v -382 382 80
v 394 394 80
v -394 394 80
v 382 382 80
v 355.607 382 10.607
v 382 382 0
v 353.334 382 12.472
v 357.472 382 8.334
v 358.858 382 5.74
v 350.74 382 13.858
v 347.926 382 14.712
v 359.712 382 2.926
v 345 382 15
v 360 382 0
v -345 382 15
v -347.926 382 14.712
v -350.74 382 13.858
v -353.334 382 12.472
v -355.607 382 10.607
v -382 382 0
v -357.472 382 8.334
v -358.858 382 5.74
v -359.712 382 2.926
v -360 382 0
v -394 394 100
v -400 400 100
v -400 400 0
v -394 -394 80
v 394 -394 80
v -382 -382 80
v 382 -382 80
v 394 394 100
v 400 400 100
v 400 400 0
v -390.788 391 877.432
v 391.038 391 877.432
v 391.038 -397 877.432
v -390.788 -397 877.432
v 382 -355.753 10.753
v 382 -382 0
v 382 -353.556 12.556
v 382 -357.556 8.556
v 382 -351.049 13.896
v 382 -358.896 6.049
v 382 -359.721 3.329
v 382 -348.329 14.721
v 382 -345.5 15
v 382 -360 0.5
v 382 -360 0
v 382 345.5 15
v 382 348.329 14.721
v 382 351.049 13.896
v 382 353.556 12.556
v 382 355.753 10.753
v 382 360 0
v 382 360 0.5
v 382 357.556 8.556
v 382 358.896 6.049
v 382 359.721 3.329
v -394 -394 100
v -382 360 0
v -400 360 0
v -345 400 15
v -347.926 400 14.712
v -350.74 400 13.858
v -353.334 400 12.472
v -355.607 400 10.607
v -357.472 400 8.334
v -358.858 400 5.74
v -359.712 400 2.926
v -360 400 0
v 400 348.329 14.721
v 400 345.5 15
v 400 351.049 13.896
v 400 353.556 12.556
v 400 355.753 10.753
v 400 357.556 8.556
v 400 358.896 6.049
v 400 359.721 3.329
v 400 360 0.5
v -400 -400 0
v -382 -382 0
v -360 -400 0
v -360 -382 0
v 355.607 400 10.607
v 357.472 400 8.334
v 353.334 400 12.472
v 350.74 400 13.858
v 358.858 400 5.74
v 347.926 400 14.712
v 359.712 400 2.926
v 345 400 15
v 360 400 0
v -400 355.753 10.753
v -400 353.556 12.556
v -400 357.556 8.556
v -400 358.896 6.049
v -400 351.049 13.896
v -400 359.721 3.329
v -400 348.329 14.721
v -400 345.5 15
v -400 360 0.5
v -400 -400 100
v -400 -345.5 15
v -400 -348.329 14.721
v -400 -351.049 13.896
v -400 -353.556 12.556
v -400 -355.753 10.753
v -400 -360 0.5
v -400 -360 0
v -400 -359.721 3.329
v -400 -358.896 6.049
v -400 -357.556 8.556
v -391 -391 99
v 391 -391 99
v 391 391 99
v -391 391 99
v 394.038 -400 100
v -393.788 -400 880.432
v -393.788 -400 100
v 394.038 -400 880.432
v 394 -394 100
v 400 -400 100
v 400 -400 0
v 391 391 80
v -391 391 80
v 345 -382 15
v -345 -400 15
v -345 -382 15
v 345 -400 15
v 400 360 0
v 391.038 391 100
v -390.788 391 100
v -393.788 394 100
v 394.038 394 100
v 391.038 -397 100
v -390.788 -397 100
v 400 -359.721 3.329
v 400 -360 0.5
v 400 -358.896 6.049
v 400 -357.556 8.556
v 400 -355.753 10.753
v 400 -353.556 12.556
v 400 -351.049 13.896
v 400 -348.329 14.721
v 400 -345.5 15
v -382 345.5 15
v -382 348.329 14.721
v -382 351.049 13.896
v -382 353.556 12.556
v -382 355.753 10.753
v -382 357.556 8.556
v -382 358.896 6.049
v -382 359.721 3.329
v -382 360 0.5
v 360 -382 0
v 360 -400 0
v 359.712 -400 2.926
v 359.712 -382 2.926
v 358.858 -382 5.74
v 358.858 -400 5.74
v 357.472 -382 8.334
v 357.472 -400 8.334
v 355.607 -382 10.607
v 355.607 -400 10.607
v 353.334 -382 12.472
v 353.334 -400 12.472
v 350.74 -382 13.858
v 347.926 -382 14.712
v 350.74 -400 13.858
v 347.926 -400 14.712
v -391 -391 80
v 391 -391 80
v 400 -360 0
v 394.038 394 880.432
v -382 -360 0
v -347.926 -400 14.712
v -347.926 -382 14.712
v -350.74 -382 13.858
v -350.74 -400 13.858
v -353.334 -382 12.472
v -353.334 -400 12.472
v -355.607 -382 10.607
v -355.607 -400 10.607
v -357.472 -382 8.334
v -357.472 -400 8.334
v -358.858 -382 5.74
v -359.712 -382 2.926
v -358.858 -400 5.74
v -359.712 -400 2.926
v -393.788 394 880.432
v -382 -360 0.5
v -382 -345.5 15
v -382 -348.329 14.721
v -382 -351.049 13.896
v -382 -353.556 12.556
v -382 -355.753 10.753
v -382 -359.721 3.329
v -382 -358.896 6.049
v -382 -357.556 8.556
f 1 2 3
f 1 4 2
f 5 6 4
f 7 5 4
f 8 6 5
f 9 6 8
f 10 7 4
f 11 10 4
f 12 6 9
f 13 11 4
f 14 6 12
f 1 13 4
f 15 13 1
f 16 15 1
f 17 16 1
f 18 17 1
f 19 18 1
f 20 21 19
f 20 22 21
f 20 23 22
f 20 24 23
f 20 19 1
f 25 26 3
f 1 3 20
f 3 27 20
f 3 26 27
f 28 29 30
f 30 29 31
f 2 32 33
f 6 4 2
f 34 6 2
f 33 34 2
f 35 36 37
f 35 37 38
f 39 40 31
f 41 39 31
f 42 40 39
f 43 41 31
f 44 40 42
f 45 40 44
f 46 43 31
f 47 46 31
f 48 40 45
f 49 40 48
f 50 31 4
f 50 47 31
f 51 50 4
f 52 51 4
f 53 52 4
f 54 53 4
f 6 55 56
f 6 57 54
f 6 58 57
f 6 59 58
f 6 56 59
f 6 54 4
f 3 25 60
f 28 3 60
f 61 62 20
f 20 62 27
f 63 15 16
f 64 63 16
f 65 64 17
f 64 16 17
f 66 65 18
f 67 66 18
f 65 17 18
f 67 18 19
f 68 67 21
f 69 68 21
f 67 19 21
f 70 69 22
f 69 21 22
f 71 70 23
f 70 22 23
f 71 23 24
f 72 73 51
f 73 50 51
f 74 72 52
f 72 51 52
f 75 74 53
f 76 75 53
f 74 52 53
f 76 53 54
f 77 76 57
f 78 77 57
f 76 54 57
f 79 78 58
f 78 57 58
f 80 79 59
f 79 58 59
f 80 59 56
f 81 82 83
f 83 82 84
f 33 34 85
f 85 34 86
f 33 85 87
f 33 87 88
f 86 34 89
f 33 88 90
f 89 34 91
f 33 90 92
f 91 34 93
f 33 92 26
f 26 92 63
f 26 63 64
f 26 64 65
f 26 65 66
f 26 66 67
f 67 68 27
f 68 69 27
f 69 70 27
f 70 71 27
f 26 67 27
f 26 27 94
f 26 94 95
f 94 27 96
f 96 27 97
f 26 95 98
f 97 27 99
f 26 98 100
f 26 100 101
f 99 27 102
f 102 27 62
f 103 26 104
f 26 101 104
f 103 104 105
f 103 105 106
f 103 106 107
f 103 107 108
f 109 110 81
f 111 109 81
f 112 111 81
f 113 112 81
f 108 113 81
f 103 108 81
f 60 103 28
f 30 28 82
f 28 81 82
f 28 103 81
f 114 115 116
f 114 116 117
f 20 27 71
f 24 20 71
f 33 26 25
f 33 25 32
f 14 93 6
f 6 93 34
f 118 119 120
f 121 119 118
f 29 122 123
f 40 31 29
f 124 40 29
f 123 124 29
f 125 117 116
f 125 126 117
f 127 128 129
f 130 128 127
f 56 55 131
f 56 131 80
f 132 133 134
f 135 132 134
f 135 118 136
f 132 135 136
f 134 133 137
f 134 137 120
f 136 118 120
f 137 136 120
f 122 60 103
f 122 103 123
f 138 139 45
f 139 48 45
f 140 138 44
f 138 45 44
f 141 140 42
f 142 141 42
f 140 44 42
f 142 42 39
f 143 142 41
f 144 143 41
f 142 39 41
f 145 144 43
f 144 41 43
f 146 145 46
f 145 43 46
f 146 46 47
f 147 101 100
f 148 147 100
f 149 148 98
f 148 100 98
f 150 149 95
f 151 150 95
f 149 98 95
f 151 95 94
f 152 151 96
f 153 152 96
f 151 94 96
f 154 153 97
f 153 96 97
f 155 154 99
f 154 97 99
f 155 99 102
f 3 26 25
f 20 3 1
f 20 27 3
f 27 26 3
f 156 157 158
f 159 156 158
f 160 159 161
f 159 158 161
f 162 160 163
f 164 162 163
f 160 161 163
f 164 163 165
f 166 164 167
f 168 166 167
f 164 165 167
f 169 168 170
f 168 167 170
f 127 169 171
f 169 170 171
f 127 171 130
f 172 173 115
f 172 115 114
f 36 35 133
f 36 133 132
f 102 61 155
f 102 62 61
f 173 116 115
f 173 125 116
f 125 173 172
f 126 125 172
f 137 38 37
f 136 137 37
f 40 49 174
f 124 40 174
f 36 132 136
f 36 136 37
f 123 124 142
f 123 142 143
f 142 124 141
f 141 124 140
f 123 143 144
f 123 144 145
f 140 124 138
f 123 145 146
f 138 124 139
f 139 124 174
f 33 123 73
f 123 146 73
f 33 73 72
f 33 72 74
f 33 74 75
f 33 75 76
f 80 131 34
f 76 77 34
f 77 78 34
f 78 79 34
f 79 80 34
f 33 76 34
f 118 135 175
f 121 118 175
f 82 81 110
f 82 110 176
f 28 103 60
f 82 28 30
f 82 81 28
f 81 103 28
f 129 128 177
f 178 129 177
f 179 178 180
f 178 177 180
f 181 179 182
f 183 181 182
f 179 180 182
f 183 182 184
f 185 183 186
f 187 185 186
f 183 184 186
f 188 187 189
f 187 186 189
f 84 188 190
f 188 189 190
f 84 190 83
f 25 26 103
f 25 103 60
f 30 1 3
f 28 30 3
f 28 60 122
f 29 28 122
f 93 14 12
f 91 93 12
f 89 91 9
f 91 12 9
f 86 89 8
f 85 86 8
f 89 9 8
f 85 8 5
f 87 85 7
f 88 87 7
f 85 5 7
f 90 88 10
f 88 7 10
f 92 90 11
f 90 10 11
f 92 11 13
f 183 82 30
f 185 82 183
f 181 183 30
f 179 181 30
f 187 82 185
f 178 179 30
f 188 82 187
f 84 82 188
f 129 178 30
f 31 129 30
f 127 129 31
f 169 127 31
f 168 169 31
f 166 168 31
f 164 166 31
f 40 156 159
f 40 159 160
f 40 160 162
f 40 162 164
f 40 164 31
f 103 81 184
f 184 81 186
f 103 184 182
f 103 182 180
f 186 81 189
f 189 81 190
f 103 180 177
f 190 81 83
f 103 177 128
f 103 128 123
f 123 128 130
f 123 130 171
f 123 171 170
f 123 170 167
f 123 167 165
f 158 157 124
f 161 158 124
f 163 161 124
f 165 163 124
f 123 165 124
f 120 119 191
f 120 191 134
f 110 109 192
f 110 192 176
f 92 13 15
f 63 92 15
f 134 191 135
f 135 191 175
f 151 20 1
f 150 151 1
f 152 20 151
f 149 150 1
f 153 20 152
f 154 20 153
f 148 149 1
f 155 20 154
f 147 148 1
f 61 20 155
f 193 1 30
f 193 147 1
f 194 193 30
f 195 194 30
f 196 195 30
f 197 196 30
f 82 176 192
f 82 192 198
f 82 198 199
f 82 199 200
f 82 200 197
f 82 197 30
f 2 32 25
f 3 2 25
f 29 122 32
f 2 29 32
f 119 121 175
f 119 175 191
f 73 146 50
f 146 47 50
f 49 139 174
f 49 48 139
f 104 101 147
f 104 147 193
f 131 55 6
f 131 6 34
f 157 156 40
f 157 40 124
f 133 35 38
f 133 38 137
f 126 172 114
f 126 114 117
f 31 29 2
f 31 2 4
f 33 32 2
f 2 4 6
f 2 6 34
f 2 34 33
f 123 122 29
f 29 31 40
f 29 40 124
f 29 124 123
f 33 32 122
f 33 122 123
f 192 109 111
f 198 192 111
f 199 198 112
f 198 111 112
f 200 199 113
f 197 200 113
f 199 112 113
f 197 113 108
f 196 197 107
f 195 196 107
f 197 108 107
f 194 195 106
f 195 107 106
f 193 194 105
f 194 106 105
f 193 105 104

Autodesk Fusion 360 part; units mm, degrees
sketch "Sketch3" plane through (0, 0, 0) normal (0, 0, 1) x (1, 0, 0)
  line L0 (-400, -400) -> (400, -400)
  line L1 (400, -400) -> (400, 400)
  line L2 (400, 400) -> (-400, 400)
  line L3 (-400, 400) -> (-400, -400)
  line L4 (382, -382) -> (382, 382)
  line L5 (382, 382) -> (-382, 382)
  line L6 (-382, 382) -> (-382, -382)
  line L7 (-382, -382) -> (382, -382)
  line L8 (-400, 400) -> (-382, 382)
  line L9 (382, -382) -> (400, -400)
  line L10 (-400, -400) -> (-382, -382)
  line L11 (382, 382) -> (400, 400)
  line L12 (-400, -400) -> (-382, -382) construction
  line L13 (382, 382) -> (400, 400) construction
  line L14 (400, -400) -> (382, -382) construction
  line L15 (-382, 382) -> (-400, 400) construction
  dimension "d11" = 800
  dimension "d12" = 800
  dimension "d13" = -18
extrude "Extrude3" add sketch "Sketch3" along normal blind 100 contours L3 L6 L8 L10 | L1 L4 L9 L11 makes body 1 at (-400, 133.3333, 66.6667) makes body 2 at (400, -133.3333, 66.6667)
extrude "Extrude4" add sketch "Sketch3" along normal blind 100 separate body contours L0 L7 L9 L10 | L2 L5 L8 L11 makes body 3 at (-133.3333, -400, 66.6667) makes body 4 at (133.3333, 400, 66.6667)
sketch "Sketch4" plane through (0, -400, 0) normal (0, -1, 0) x (1, 0, 0)
  line L0 (-400, 0) -> (400, 0)
  line L1 (400, 0) -> (400, 100)
  line L2 (400, 100) -> (-400, 100)
  line L3 (-400, 100) -> (-400, 0)
  line L4 (-350, 0) -> (0, 0)
  line L5 (-350, 15) -> (0, 15)
  line L6 (-350, 0) -> (-365, 0)
  arc A0 (-350, 15) -> (-365, 0) centre (-350, 0) ccw
  spline S0 degree 5 poles (0, 0) (0, 7.6752) (0, 23.0256) (0, 46.0513) (0, 76.7521) (0, 115.1282) (0, 145.829) (0, 168.8546) (0, 184.2051) (0, 191.8803) knots 0 0 0 0 0 0 0.2 0.4 0.6 0.8 1 1 1 1 1 1 construction
  line L7 (0, 1.75) -> (0, 22.5) construction
  line L8 (350, 0) -> (0, 0)
  line L9 (350, 0) -> (365, 0)
  arc A1 (365, 0) -> (350, 15) centre (350, 0) ccw
  line L10 (350, 15) -> (0, 15)
  point P0 (-400, 0)
  dimension "d18" = -15
  dimension "d19" = 50
ref_plane "WorkPlane1" through (0, -400, 50) normal (0, -1, 0) x (1, 0, 0)
sketch "Sketch6" plane through (0, 0, 100) normal (0, 0, 1) x (-1, 0, 0)
  line L0 (400, 400) -> (-400, 400)
  line L1 (-400, 400) -> (-382, 382)
  line L2 (-382, 382) -> (382, 382)
  line L3 (382, 382) -> (400, 400)
  line L4 (394, 394) -> (-394, 394)
  line L5 (-394, 394) -> (-394, -394)
  line L6 (-394, -394) -> (394, -394)
  line L7 (394, -394) -> (394, 394)
  line L8 (394, 394) -> (-394, -394) construction
  line L9 (-394, 394) -> (394, -394) construction
  dimension "d38" = 12
extrude "Extrude8" cut sketch "Sketch6" against normal blind 20 contours L1 L2 L3 L5 L6 L7 | L1 L2 L3 L4 bodies 1 2 3 4
sketch "Sketch11" plane through (0, -400, 0) normal (0, -1, 0) x (1, 0, 0)
  line L0 (0, 0) -> (0, 171.862) construction
  line L1 (-360, 0) -> (-360, -0.0001)
  line L2 (-345, 15) -> (0, 15)
  arc A0 (-345, 15) -> (-360, -0.0001) centre (-345, 0) ccw
  line L3 (-360, 0) -> (0, 0)
  line L4 (345, 15) -> (0, 15)
  line L5 (360, 0) -> (0, 0)
  arc A1 (360, -0.0001) -> (345, 15) centre (345, 0) ccw
  point P0 (-360.0001, 15)
  point P1 (-400, 0)
  dimension "d67" = 15
  dimension "d68" = 40
  dimension "d69" = 15
extrude "Extrude12" cut sketch "Sketch11" against normal blind 840 bodies 3 4
sketch "Sketch12" plane through (-400, 0, 0) normal (-1, 0, 0) x (0, -1, 0)
  line L0 (-400, 0) -> (400, 0)
  line L1 (400, 0) -> (400, 100)
  line L2 (400, 100) -> (-400, 100)
  line L3 (-400, 100) -> (-400, 0)
  line L4 (0, 0) -> (0, 212.8854) construction
  line L5 (-360, 0) -> (-360, 0.5)
  line L6 (-345.5, 15) -> (0, 15)
  arc A0 (-345.5, 15) -> (-360, 0.5) centre (-345.5, 0.5) ccw
  line L7 (-360, 0) -> (0, 0)
  line L8 (345.5, 15) -> (0, 15)
  arc A1 (360, 0.5) -> (345.5, 15) centre (345.5, 0.5) ccw
  line L9 (360, 0) -> (0, 0)
  line L10 (360, 0.5) -> (360, 0)
  point P0 (-360, 15)
  dimension "d76" = 40
  dimension "d77" = 15
  dimension "d78" = 14.5
extrude "Extrude13" cut sketch "Sketch12" against normal blind 950 contours L0 L5 L6 A0 L7 L8 A1 L9 L10 bodies 2 1
sketch "Sketch13" plane through (0, 0, 100) normal (0, 0, 1) x (-1, 0, 0)
  line L0 (394, -394) -> (-394, -394)
  line L1 (-394, -394) -> (-400, -400)
  line L2 (-400, -400) -> (400, -400)
  line L3 (400, -400) -> (394, -394)
  line L4 (391, -391) -> (-391, -391)
  line L5 (-391, -391) -> (-391, 391)
  line L6 (-391, 391) -> (391, 391)
  line L7 (391, 391) -> (391, -391)
  line L8 (391, -391) -> (-391, 391) construction
  line L9 (-391, -391) -> (391, 391) construction
  dimension "d81" = 3
extrude "Extrude14" add sketch "Sketch13" along normal blind 19 from surface at -20 separate body contours L4 L5 L6 L7 makes body 5
sketch "Sketch14" plane through (0, -400, 0) normal (0, -1, 0) x (1, 0, 0)
  arc A0 (360, 0) -> (345, 15) centre (345, 0) ccw
  line L0 (360, 0) -> (400, 0)
  line L1 (400, 0) -> (400, 100)
  line L2 (400, 100) -> (-400, 100)
  line L3 (-400, 100) -> (-400, 0)
  line L4 (-400, 0) -> (-360, 0)
  arc A1 (-345, 15) -> (-360, 0) centre (-345, 0) ccw
  line L5 (-345, 15) -> (345, 15)
  line L6 (-393.7875, 80.4321) -> (394.0376, 80.4321)
  line L7 (394.0376, 80.4321) -> (394.0376, 880.4321)
  line L8 (394.0376, 880.4321) -> (-393.7875, 880.4321)
  line L9 (-393.7875, 880.4321) -> (-393.7875, 80.4321)
  dimension "d85" = 800
extrude "Extrude15" add sketch "Sketch14" against normal blind 794 separate body contours L2 L7 L8 L9 makes body 6
shell "Shell1" thickness 3 removed faces 1 at (131.4293, -135.3333, 100) on bodies 6
